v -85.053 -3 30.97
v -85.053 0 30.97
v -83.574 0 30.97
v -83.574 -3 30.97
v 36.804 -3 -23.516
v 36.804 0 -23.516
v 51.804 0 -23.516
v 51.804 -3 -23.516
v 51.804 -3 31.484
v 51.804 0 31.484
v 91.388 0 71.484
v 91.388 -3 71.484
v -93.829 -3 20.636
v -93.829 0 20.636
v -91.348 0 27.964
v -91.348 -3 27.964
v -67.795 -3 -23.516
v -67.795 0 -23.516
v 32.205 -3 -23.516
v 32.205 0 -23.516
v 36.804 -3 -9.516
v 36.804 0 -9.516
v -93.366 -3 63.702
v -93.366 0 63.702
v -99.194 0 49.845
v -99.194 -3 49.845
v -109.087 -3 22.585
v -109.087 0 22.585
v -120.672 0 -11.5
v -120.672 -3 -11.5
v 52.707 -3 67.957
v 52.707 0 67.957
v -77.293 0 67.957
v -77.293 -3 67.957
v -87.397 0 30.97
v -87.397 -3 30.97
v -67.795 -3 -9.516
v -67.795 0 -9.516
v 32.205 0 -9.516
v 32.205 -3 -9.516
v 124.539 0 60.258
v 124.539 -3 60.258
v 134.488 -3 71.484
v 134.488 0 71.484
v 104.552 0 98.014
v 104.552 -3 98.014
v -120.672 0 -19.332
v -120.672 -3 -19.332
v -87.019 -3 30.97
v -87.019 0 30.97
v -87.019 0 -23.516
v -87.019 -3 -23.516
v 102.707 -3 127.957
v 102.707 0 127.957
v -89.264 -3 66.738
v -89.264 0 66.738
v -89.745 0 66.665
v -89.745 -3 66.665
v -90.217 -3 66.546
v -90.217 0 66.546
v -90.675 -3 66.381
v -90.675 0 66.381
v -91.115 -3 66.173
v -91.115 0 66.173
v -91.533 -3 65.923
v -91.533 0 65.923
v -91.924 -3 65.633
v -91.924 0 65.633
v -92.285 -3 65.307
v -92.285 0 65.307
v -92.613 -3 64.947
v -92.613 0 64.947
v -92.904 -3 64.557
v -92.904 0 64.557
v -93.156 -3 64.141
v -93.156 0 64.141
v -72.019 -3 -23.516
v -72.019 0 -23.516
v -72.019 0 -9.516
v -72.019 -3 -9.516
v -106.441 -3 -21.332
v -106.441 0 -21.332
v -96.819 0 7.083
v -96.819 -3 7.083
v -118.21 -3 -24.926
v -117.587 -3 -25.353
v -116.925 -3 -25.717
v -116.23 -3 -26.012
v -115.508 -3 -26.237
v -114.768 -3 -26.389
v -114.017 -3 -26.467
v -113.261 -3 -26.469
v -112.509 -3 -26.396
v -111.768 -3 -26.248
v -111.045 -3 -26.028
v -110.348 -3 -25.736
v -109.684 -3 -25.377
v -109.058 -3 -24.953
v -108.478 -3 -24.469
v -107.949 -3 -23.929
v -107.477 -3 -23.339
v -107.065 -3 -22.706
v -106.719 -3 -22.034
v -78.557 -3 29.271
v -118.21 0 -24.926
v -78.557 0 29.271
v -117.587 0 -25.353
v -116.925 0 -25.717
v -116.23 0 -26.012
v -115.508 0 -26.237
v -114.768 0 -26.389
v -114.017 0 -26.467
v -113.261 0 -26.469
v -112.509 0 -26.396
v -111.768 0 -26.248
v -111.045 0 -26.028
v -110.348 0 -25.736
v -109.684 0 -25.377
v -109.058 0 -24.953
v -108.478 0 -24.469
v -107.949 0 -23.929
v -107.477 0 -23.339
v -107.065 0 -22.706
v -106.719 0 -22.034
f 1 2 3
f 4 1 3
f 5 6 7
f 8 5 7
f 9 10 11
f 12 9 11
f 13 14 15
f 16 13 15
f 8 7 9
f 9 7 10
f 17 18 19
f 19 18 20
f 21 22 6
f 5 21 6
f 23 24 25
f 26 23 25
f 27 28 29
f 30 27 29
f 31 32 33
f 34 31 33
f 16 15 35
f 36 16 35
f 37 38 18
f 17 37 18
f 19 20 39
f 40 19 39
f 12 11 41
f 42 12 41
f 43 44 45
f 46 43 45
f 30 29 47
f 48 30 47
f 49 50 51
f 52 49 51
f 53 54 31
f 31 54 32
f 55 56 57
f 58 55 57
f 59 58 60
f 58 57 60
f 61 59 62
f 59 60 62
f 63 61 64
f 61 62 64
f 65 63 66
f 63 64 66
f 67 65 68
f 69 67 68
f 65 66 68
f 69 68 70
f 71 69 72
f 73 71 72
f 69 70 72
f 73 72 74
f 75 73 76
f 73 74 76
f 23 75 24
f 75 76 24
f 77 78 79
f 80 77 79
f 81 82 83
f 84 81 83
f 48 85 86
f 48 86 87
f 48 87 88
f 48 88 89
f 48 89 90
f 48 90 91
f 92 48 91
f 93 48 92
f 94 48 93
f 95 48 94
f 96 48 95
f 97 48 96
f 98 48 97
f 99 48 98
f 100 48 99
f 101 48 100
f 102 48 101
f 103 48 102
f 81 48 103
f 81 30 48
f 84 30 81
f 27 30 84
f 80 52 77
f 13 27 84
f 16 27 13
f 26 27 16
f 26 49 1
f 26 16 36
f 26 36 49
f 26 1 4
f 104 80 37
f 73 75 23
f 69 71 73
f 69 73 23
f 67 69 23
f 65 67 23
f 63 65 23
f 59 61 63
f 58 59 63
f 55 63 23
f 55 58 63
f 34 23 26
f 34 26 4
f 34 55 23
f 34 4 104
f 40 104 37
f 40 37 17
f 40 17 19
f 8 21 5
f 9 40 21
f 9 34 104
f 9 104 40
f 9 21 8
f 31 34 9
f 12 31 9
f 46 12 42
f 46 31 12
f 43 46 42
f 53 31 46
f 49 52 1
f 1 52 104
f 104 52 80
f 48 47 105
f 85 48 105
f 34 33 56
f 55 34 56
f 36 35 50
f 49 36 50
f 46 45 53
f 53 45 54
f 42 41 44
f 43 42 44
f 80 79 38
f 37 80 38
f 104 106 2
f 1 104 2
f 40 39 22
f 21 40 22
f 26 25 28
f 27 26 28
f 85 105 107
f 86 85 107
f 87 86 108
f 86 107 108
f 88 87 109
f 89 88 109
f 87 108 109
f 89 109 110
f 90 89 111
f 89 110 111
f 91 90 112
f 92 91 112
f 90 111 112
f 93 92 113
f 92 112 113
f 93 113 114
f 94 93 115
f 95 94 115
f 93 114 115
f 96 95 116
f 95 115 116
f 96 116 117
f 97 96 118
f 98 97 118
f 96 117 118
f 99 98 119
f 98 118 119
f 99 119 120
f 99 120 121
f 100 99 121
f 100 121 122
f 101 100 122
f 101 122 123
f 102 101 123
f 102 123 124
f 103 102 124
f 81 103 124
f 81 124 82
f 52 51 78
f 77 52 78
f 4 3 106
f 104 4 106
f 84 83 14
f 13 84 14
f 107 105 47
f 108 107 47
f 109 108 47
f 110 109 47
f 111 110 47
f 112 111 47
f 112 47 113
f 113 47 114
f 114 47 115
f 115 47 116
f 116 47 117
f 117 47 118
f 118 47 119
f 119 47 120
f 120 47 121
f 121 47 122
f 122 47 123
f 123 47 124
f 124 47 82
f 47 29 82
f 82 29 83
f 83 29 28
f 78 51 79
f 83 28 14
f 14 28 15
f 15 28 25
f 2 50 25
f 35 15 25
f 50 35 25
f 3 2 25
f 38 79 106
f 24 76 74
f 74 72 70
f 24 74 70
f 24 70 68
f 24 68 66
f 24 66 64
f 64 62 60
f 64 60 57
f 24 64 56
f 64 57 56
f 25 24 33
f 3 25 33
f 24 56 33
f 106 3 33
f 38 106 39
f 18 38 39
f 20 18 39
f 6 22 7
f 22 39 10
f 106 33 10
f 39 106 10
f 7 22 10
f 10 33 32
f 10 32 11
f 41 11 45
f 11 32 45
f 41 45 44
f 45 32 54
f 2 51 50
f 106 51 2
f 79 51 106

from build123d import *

# Parameters (mm, degrees)
F1_DEPTH = 3
F2_DEPTH = 3


with BuildPart() as f1:
    # F0 (on Front) → F1 (new body)
    with BuildSketch(Plane.XZ):
        with BuildLine():
            Line((52.7068123221, 67.9570013285), (-77.2931876779, 67.9570013285))
            Line((-77.2931876779, 67.9570013285), (-89.2639196203, 66.7380527995))
            ThreePointArc((-89.2639196203, 66.7380527995), (-91.7316731318, 65.7829428457), (-93.3663876923, 63.7021375394))
            Line((-93.3663876923, 63.7021375394), (-99.1941262898, 49.8450988929))
            Line((-99.1941262898, 49.8450988929), (-109.0870224739, 22.5846769392))
            Line((-109.0870224739, 22.5846769392), (-120.6715287069, -11.5004989491))
            Line((-120.6715287069, -11.5004989491), (-120.6715287069, -19.3318230512))
            Line((-120.6715287069, -19.3318230512), (-118.2102517237, -24.9256293032))
            ThreePointArc((-118.2102517237, -24.9256293032), (-111.4038296451, -26.1471340573), (-106.4409637677, -21.3315948706))
            Line((-106.4409637677, -21.3315948706), (-96.8187674333, 7.0834247089))
            Line((-96.8187674333, 7.0834247089), (-93.8294616156, 20.6357413095))
            Line((-93.8294616156, 20.6357413095), (-91.3480535534, 27.9635130805))
            Line((-91.3480535534, 27.9635130805), (-87.3968608702, 30.9696110895))
            Line((-87.3968608702, 30.9696110895), (-87.0189213753, 30.9696110895))
            Line((-87.0189213753, 30.9696110895), (-87.0189213753, -23.5164099128))
            Line((-87.0189213753, -23.5164099128), (-72.0189213753, -23.5164099128))
            Line((-72.0189213753, -23.5164099128), (-72.0189213753, -9.5164099128))
            Line((-72.0189213753, -9.5164099128), (-67.7953569258, -9.5164099128))
            Line((-67.7953569258, -9.5164099128), (-67.7953569258, -23.5164099128))
            Line((-67.7953569258, -23.5164099128), (32.2046430742, -23.5164099128))
            Line((32.2046430742, -23.5164099128), (32.2046430742, -9.5164099128))
            Line((32.2046430742, -9.5164099128), (36.8044135138, -9.5164099128))
            Line((36.8044135138, -9.5164099128), (36.8044135138, -23.5164099128))
            Line((36.8044135138, -23.5164099128), (51.8044135138, -23.5164099128))
            Line((51.8044135138, -23.5164099128), (51.8044135138, 31.4835900872))
            Line((51.8044135138, 31.4835900872), (91.3881844313, 71.4835900872))
            Line((91.3881844313, 71.4835900872), (124.5390406074, 60.2576943637))
            Line((124.5390406074, 60.2576943637), (134.4878729613, 71.4835900872))
            Line((134.4878729613, 71.4835900872), (104.552151032, 98.0138096975))
            Line((104.552151032, 98.0138096975), (102.7068123221, 127.9570013285))
            Line((102.7068123221, 127.9570013285), (52.7068123221, 67.9570013285))
        make_face()
        Polygon((-85.0534210869, 30.9696110895), (-87.0189213753, 30.9696110895), (-87.0189213753, 31.4835900872), align=None, mode=Mode.SUBTRACT)
        Polygon((-78.5569989721, 29.2707944844), (-85.0534210869, 30.9696110895), (-83.5737233683, 30.9696110895), align=None, mode=Mode.SUBTRACT)
        Polygon((-87.0189213753, 31.4835900872), (-87.0189213753, 30.9696110895), (-85.0534210869, 30.9696110895), align=None)
    extrude(amount=F1_DEPTH)

    # F0 (on Front) → F2 (join)
    with BuildSketch(Plane.XZ):
        with BuildLine():
            Line((52.7068123221, 67.9570013285), (-77.2931876779, 67.9570013285))
            Line((-77.2931876779, 67.9570013285), (-89.2639196203, 66.7380527995))
            ThreePointArc((-89.2639196203, 66.7380527995), (-91.7316731318, 65.7829428457), (-93.3663876923, 63.7021375394))
            Line((-93.3663876923, 63.7021375394), (-99.1941262898, 49.8450988929))
            Line((-99.1941262898, 49.8450988929), (-109.0870224739, 22.5846769392))
            Line((-109.0870224739, 22.5846769392), (-120.6715287069, -11.5004989491))
            Line((-120.6715287069, -11.5004989491), (-120.6715287069, -19.3318230512))
            Line((-120.6715287069, -19.3318230512), (-118.2102517237, -24.9256293032))
            ThreePointArc((-118.2102517237, -24.9256293032), (-111.4038296451, -26.1471340573), (-106.4409637677, -21.3315948706))
            Line((-106.4409637677, -21.3315948706), (-96.8187674333, 7.0834247089))
            Line((-96.8187674333, 7.0834247089), (-93.8294616156, 20.6357413095))
            Line((-93.8294616156, 20.6357413095), (-91.3480535534, 27.9635130805))
            Line((-91.3480535534, 27.9635130805), (-87.3968608702, 30.9696110895))
            Line((-87.3968608702, 30.9696110895), (-87.0189213753, 30.9696110895))
            Line((-87.0189213753, 30.9696110895), (-87.0189213753, -23.5164099128))
            Line((-87.0189213753, -23.5164099128), (-72.0189213753, -23.5164099128))
            Line((-72.0189213753, -23.5164099128), (-72.0189213753, -9.5164099128))
            Line((-72.0189213753, -9.5164099128), (-67.7953569258, -9.5164099128))
            Line((-67.7953569258, -9.5164099128), (-67.7953569258, -23.5164099128))
            Line((-67.7953569258, -23.5164099128), (32.2046430742, -23.5164099128))
            Line((32.2046430742, -23.5164099128), (32.2046430742, -9.5164099128))
            Line((32.2046430742, -9.5164099128), (36.8044135138, -9.5164099128))
            Line((36.8044135138, -9.5164099128), (36.8044135138, -23.5164099128))
            Line((36.8044135138, -23.5164099128), (51.8044135138, -23.5164099128))
            Line((51.8044135138, -23.5164099128), (51.8044135138, 31.4835900872))
            Line((51.8044135138, 31.4835900872), (91.3881844313, 71.4835900872))
            Line((91.3881844313, 71.4835900872), (124.5390406074, 60.2576943637))
            Line((124.5390406074, 60.2576943637), (134.4878729613, 71.4835900872))
            Line((134.4878729613, 71.4835900872), (104.552151032, 98.0138096975))
            Line((104.552151032, 98.0138096975), (102.7068123221, 127.9570013285))
            Line((102.7068123221, 127.9570013285), (52.7068123221, 67.9570013285))
        make_face()
        Polygon((-85.0534210869, 30.9696110895), (-87.0189213753, 30.9696110895), (-87.0189213753, 31.4835900872), align=None, mode=Mode.SUBTRACT)
        Polygon((-78.5569989721, 29.2707944844), (-85.0534210869, 30.9696110895), (-83.5737233683, 30.9696110895), align=None, mode=Mode.SUBTRACT)
        Polygon((-87.0189213753, 31.4835900872), (-87.0189213753, 30.9696110895), (-85.0534210869, 30.9696110895), align=None)
    extrude(amount=F2_DEPTH)


solid = f1.part
